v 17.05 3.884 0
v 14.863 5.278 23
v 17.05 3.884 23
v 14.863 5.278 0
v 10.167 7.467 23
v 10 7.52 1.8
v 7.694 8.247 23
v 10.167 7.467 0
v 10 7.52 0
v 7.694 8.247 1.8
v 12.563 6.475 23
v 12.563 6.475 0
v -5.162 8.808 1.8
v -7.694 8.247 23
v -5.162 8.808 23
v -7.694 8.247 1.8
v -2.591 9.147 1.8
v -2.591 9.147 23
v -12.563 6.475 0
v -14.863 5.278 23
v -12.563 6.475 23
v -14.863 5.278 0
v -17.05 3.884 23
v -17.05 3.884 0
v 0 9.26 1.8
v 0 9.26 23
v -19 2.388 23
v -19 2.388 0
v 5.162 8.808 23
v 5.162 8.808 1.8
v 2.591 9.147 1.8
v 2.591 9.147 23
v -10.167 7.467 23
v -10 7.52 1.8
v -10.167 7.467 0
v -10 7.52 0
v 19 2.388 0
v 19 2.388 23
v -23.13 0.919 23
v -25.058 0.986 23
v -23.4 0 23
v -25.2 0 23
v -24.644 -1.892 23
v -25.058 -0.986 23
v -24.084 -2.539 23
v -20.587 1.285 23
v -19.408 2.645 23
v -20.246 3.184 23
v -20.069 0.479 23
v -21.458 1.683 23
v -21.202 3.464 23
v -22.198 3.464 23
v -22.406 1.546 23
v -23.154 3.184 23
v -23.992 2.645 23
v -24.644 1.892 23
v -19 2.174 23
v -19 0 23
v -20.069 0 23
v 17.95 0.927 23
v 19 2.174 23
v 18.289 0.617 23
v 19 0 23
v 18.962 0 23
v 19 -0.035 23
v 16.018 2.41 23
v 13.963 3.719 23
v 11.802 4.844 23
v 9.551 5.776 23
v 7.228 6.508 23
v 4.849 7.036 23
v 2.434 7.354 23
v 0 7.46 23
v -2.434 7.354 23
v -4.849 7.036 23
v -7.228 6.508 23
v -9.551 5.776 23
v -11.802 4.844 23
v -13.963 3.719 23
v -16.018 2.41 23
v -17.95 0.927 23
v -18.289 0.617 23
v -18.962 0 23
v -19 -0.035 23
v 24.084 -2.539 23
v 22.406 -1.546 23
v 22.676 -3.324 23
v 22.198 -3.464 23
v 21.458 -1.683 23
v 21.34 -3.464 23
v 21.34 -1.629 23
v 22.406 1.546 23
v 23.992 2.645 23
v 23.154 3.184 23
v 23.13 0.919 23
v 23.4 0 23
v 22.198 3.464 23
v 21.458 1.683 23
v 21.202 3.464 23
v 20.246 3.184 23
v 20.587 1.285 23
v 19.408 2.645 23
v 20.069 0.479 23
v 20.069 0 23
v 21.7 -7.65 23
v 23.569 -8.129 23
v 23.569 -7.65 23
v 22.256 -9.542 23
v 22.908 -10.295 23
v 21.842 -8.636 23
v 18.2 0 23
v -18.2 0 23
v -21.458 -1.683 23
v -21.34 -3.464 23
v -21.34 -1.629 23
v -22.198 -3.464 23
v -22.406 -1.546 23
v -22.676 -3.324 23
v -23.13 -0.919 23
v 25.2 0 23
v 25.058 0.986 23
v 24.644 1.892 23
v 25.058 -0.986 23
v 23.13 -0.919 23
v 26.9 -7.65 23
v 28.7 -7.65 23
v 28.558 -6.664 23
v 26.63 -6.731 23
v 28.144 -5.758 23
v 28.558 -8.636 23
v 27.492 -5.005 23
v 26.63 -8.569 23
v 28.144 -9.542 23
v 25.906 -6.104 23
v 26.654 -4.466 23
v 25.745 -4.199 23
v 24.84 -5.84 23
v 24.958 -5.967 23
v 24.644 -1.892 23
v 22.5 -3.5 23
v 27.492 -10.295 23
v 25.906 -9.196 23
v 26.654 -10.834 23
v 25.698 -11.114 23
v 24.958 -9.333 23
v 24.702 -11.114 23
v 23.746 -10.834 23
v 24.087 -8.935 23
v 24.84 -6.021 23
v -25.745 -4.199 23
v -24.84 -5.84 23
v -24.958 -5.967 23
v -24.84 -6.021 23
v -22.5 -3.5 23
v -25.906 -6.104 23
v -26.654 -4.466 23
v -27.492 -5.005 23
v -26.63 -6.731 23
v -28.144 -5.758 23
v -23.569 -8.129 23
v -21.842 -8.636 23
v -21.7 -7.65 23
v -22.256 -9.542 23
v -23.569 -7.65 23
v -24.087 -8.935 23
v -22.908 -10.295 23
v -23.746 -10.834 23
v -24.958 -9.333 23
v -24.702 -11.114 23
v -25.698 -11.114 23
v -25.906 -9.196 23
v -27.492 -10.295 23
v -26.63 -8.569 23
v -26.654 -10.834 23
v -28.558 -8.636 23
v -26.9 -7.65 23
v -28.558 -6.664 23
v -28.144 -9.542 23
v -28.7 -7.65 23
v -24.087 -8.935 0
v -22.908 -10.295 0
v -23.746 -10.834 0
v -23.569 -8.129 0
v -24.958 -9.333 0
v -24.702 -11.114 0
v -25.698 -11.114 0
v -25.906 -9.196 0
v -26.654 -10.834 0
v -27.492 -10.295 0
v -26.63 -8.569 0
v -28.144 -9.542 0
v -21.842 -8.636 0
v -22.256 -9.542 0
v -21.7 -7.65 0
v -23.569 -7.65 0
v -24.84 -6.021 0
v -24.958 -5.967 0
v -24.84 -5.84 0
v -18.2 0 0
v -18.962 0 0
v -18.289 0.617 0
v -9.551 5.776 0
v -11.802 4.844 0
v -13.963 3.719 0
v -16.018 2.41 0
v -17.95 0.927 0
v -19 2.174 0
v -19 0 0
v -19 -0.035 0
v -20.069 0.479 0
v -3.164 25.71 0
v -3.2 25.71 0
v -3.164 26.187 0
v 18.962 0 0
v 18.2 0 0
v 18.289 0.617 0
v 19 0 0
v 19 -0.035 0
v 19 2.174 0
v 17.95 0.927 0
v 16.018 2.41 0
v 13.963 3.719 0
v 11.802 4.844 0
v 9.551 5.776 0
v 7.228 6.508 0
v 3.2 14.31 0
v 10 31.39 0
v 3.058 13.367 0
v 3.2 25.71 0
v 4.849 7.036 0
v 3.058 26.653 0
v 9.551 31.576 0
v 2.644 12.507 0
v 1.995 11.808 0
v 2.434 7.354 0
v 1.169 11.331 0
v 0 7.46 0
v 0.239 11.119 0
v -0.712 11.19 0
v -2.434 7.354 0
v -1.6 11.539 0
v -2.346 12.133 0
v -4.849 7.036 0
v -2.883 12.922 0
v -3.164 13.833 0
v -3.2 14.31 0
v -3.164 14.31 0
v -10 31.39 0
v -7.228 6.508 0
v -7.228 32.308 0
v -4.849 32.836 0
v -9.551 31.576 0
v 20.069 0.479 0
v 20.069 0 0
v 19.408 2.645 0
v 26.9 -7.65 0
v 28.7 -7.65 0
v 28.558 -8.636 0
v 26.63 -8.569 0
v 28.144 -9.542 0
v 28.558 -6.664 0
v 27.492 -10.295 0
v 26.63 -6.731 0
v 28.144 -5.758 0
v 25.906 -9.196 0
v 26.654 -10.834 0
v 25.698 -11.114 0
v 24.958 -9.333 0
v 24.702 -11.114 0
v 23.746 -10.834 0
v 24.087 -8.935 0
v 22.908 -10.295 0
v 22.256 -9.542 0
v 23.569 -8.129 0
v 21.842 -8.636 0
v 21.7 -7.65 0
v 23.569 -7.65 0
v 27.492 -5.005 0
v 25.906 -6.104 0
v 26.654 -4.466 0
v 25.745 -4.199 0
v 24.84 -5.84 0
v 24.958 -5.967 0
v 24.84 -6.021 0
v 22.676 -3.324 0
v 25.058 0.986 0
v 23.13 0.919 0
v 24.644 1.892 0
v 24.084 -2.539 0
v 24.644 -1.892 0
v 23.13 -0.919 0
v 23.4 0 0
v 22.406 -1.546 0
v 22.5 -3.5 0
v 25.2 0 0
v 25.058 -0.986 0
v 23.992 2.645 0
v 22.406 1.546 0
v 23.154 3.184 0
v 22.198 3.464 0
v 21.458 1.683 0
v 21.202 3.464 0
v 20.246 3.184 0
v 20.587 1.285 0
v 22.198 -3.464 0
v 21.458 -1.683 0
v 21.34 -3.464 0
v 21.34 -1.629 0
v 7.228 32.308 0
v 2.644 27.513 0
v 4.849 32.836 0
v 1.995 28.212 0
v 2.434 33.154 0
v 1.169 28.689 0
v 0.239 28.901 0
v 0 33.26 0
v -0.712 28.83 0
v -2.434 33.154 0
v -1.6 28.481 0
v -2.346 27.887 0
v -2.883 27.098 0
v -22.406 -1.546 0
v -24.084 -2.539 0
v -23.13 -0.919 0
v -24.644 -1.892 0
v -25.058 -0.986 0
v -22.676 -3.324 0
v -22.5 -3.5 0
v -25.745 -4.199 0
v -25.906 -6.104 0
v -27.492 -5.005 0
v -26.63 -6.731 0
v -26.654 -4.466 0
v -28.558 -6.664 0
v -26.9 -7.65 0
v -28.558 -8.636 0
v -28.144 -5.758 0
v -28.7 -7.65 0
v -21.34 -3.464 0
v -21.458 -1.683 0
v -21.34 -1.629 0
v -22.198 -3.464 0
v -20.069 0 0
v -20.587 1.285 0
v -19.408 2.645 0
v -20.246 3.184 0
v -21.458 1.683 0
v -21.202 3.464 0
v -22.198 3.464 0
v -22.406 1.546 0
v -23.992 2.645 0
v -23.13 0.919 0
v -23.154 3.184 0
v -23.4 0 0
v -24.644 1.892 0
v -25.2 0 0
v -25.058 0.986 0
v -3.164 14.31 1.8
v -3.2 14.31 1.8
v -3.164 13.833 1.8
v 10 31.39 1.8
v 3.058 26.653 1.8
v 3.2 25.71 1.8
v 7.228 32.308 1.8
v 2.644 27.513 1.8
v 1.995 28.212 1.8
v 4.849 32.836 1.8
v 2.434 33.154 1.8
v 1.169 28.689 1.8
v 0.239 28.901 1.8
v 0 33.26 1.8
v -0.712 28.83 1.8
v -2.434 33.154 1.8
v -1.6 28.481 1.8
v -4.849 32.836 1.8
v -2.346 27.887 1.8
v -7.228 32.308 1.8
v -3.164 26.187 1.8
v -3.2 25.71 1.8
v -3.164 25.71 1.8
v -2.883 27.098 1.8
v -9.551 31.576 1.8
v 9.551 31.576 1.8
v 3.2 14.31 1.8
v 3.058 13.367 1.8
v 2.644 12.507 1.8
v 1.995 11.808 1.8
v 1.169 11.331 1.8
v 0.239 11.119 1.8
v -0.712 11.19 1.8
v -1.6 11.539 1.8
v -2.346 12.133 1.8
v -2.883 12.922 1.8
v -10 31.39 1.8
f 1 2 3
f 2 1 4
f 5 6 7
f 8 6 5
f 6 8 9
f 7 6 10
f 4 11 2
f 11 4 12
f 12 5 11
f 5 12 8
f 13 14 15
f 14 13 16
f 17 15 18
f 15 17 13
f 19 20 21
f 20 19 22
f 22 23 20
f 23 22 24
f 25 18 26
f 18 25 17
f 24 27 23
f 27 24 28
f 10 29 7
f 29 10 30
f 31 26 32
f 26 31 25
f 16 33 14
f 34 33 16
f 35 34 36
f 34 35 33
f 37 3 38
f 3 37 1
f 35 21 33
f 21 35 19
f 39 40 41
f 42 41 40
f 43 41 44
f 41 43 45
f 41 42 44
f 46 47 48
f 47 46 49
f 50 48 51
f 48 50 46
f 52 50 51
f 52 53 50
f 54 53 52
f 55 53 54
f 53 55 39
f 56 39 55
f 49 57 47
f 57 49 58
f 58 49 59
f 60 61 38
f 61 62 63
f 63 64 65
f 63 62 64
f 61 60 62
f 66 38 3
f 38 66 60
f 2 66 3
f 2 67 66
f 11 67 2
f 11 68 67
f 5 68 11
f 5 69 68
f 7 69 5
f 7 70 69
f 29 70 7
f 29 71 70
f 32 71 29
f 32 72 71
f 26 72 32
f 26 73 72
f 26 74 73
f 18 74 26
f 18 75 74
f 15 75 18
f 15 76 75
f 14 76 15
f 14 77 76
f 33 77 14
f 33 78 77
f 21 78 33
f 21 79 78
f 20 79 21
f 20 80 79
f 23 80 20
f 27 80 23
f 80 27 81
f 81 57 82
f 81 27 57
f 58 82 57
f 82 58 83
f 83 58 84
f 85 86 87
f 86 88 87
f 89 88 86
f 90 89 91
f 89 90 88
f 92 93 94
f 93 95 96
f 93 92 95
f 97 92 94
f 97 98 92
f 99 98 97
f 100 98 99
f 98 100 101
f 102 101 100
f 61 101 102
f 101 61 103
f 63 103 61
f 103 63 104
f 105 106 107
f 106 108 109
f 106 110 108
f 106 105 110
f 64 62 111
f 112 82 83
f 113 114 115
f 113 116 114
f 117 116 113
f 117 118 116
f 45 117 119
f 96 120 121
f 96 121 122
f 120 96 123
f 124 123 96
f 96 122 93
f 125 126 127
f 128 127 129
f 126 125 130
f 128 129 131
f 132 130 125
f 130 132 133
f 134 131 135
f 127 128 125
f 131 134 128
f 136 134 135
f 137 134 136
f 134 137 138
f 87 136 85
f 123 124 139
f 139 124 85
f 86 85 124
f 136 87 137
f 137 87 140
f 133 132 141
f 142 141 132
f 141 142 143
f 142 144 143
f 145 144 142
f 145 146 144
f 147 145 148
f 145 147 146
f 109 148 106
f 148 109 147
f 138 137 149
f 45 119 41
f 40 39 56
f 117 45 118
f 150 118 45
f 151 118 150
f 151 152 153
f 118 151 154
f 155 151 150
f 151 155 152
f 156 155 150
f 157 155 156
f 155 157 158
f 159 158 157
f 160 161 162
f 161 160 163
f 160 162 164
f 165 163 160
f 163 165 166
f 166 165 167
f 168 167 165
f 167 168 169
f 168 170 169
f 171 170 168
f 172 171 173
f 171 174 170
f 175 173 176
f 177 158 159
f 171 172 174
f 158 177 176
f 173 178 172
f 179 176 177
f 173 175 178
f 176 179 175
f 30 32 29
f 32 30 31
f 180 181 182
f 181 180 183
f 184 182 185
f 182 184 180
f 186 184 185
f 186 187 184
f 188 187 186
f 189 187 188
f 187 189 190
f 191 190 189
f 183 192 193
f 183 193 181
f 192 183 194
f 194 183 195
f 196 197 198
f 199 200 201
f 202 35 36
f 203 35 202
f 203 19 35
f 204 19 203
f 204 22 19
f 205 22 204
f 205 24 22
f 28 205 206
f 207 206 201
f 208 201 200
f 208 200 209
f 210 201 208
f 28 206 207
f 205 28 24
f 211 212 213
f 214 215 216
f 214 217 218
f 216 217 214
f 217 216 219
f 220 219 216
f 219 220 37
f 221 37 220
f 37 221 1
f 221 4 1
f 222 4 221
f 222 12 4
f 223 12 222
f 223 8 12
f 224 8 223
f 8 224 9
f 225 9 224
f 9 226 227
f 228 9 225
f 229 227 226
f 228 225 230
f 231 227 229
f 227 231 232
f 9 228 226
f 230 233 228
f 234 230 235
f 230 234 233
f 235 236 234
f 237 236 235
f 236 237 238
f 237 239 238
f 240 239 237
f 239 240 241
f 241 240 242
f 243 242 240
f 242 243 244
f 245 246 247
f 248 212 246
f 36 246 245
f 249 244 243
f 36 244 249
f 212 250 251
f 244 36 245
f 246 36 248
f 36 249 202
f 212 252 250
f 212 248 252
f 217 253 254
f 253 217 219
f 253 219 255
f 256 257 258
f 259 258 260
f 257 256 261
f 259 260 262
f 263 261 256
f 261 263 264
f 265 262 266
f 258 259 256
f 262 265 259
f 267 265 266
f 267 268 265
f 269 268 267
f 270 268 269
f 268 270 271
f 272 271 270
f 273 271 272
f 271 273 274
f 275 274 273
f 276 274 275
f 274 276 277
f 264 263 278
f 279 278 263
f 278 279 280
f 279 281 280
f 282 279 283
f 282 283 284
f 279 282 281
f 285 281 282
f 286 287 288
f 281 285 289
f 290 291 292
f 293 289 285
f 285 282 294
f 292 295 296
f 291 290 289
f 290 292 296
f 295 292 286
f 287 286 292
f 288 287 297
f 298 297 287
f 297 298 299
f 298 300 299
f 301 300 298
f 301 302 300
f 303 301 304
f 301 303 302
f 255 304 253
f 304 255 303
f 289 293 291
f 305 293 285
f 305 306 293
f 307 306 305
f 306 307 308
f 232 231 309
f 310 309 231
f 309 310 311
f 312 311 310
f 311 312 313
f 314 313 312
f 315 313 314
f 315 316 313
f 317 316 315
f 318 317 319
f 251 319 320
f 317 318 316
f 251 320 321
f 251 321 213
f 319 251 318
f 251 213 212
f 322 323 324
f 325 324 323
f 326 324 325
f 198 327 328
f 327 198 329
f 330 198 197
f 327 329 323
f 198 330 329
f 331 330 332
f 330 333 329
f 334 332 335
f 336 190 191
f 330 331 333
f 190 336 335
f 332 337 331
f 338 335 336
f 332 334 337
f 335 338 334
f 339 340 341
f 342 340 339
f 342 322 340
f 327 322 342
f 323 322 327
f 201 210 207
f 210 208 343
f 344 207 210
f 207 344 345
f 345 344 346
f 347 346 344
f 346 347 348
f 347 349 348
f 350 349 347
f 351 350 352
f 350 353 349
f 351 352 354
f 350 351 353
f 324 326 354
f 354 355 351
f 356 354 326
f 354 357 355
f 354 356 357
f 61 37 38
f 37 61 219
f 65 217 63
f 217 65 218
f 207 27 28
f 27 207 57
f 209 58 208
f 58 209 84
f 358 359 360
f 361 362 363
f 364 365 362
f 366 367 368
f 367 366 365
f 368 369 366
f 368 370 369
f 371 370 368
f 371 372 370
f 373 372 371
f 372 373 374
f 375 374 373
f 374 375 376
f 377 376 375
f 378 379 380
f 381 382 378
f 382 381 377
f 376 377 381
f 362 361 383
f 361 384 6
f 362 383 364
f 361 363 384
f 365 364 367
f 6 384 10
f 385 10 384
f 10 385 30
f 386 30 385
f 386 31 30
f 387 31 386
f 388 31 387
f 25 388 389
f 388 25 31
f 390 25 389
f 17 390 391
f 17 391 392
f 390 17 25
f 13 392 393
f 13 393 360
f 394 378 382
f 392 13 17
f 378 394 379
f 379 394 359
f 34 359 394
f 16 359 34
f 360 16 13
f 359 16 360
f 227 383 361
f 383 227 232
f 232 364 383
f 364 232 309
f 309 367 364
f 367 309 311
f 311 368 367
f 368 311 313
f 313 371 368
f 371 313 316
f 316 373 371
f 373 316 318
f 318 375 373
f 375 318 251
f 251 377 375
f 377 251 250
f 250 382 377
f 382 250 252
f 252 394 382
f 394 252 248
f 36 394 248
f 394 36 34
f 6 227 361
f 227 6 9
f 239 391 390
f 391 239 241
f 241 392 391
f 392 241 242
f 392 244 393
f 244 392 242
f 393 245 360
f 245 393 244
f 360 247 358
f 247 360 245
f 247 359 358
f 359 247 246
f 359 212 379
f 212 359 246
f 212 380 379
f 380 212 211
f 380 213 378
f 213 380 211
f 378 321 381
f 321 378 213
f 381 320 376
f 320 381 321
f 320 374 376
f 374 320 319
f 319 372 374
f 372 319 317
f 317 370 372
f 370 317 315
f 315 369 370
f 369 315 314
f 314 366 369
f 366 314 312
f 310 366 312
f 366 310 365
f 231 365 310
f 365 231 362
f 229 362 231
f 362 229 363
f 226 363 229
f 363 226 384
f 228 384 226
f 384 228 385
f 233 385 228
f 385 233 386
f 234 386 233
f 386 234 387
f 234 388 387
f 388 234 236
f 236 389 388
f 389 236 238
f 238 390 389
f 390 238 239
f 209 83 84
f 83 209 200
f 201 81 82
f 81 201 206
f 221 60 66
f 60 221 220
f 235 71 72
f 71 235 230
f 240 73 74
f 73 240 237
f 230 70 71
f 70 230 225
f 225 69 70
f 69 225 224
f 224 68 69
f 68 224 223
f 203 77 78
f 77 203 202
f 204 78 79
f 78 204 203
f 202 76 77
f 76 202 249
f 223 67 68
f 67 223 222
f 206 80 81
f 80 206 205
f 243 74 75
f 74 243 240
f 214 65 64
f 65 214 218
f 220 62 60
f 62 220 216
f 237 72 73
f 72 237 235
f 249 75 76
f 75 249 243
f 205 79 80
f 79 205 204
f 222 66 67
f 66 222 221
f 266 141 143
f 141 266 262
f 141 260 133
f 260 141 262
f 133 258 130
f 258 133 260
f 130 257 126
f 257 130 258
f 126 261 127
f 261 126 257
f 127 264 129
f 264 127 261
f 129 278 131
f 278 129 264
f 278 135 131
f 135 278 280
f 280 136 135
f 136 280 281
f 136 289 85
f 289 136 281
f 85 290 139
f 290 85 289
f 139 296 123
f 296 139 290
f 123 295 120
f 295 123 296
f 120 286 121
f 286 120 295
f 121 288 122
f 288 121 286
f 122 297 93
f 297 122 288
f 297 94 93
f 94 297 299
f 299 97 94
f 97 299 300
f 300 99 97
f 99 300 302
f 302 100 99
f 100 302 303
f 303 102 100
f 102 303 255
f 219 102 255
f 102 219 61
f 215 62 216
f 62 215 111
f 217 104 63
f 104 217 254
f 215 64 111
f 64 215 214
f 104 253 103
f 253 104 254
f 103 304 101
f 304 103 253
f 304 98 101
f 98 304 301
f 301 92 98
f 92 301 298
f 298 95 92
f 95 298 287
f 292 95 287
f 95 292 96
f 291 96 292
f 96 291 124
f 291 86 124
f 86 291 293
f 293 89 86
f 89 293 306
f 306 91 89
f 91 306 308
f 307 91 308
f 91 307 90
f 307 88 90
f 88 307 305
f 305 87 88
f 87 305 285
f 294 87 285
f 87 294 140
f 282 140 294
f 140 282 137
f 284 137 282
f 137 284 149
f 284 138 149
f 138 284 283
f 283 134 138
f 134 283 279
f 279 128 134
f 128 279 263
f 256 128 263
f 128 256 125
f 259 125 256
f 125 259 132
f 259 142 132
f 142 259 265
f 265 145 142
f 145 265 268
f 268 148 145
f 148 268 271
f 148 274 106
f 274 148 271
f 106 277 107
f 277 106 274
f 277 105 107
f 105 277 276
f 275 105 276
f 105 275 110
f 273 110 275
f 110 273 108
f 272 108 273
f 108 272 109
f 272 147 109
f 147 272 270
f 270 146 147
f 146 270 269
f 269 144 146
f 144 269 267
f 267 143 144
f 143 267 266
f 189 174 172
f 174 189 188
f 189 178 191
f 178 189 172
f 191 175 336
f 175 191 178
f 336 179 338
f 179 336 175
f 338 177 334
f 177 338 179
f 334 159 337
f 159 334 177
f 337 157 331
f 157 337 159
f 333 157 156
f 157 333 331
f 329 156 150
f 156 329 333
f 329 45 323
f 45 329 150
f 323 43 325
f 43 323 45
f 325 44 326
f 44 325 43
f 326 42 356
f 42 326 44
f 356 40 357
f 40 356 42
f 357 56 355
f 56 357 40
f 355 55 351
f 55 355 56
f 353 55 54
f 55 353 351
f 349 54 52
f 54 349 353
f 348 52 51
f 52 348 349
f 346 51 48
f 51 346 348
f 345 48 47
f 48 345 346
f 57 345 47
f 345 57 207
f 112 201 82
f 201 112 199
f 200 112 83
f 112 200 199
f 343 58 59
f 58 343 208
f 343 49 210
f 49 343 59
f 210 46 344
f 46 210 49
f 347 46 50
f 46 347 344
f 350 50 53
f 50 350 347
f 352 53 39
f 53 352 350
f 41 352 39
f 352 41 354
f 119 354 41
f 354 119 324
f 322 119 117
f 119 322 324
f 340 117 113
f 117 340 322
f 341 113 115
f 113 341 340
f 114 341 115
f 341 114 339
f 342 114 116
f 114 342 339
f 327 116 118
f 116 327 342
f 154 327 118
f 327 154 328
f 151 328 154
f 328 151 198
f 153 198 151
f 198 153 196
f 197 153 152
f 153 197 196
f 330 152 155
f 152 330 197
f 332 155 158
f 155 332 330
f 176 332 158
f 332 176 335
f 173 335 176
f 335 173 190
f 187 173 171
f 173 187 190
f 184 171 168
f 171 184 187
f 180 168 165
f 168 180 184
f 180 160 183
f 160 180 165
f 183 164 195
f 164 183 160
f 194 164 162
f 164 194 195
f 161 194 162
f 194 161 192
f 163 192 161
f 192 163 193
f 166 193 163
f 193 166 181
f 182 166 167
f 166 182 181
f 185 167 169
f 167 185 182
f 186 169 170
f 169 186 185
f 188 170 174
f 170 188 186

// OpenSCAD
// -*- mode: SCAD ; c-file-style: "ellemtel" ; coding: utf-8 -*-
//
// NN
//
// © 2018–2019 Roland Sieker <ospalh@gmail.com>
// Licence: CC-BY-SA 4.0

/* [Global] */

// … to preview. You will get all parts as separate STLs when you click “Create Thing”.
part = "s"; // [s: Set, a: Part A, b: Part B]

// Set this to “render” and click on “Create Thing” when done with the setup.
preview = 1; // [0:render, 1:preview]

/* [Sizes] */

// bla bla
b=38;
b2=45;
h=7.46;
pw=20;
ph=24;
rh=3.2;
l_s=11.4;
h_lh=3.65;
ed=23;
r_hk=1.7;
w_hk=1.8;

/* [Hidden] */

// Done with the customizer

// *******************************************************
// Extra parameters. These can be changed reasonably safely.


w = 1.8;  // Wall width
p = 1.2;  // Bottom, top plate hight
c = 0.4;  // Clearance
angle = 60; // Overhangs much below 60° are a problem for me

// *******************************************************
// Some shortcuts. These shouldn’t be changed

r = b*b/(8*h) + h/2;

haw = asin(b/(2*r));



module kmirror(maxis=[1, 0, 0])
{
   // Keep *and* mirror an object. Standard is left and right mirroring.
   children();
   mirror(maxis)
   {
      children();
   }
}

tau = 2 * PI;  // π is still wrong. τ = circumference / r

xy_factor = 1/tan(angle);
// To get from a hight to a horizontal width inclined correctly
z_factor = tan(angle);  // The other way around


some_distance = 50;
ms = 0.01;  // Muggeseggele.

// fn for differently sized objects and fs, fa; all for preview or rendering.
pna = 40;
pnb = 15;
pa = 5;
ps = 1;
rna = 180;
rnb = 30;
ra = 2;
rs = 0.25;
function na() = (preview) ? pna : rna;
function nb() = (preview) ? pnb : rnb;
$fs = (preview) ? ps : rs;
$fa = (preview) ? pa : ra;

// *******************************************************
// End setup



// *******************************************************
// Generate the parts

print_part();


if ("s" == part)
{
   preview_parts();
}

if ("st" == part)
{
   // Use "st" during development
   stack_parts();
}

module print_part()
{
   if ("a" == part)
   {
      part_a();
   }

}

module preview_parts()
{
   part_a();
}

module stack_parts()
{
   // intersection()
   {
      color("yellow")
      {
         part_a();
      }

   }
}

// *******************************************************
// Code for the parts themselves


module part_a()
{
   difference()
   {
      union()
      {
         sarc();
         linear_extrude(w)
         {
            plate();
         }
      }
      harc();
   }
   kmirror()
   {
      // translate([b/2,-r_hk+ms])
      linear_extrude(ed)
      {
         translate([b/2+r_hk+1,0])
         {
            difference()
            {
               circle(r_hk+w_hk);
               circle(r_hk);
               translate([-r_hk-w_hk-w_hk*0.2,-r_hk-w_hk])
               {
                  square([r_hk+w_hk,r_hk+w_hk]);
               }
            }
         }
         translate([b2/2,-r_hk-w])
         {
            rotate(-45)
            square([2*r_hk,w]);
         }
         translate([b2/2+r_hk+1,-4.5*r_hk])
         {
            difference()
            {
               circle(r_hk+w_hk);
               circle(r_hk);
               translate([-r_hk-w_hk-w_hk*0.2,0])
               {
                  square([r_hk+w_hk,2*r_hk+2*w_hk]);
               }
            }
         }
      }

   }
}


module sarc()
{
   intersection()
   {
      translate([0,-r+h, 0])
      {
         linear_extrude(ed)
         {
            circle(r+w);
         }
      }
      translate([-b/2, -r, -ms])
      cube([b, 2*r, 25]);
   }
}


module harc()
{
   translate([0,-r+h, -ms])
   {
      linear_extrude(ed+2*ms)
      {
         circle(r);
      }
   }

}

module plate()
{
   intersection()
   {
      difference()
      {
         translate([-pw/2, h])
         {
            square([pw, r+ph+2+w]);
         }
         translate([0,rh+h_lh+h])
         {
            circle(rh);
            translate([0,l_s])
            {
               circle(rh);
            }
         }
         translate([-rh,rh+h_lh+h])
         {
            square([2*rh,l_s]);
         }
      }
      translate([0,h+ph+w-r])
      {
         circle(r);
      }
   }
}
